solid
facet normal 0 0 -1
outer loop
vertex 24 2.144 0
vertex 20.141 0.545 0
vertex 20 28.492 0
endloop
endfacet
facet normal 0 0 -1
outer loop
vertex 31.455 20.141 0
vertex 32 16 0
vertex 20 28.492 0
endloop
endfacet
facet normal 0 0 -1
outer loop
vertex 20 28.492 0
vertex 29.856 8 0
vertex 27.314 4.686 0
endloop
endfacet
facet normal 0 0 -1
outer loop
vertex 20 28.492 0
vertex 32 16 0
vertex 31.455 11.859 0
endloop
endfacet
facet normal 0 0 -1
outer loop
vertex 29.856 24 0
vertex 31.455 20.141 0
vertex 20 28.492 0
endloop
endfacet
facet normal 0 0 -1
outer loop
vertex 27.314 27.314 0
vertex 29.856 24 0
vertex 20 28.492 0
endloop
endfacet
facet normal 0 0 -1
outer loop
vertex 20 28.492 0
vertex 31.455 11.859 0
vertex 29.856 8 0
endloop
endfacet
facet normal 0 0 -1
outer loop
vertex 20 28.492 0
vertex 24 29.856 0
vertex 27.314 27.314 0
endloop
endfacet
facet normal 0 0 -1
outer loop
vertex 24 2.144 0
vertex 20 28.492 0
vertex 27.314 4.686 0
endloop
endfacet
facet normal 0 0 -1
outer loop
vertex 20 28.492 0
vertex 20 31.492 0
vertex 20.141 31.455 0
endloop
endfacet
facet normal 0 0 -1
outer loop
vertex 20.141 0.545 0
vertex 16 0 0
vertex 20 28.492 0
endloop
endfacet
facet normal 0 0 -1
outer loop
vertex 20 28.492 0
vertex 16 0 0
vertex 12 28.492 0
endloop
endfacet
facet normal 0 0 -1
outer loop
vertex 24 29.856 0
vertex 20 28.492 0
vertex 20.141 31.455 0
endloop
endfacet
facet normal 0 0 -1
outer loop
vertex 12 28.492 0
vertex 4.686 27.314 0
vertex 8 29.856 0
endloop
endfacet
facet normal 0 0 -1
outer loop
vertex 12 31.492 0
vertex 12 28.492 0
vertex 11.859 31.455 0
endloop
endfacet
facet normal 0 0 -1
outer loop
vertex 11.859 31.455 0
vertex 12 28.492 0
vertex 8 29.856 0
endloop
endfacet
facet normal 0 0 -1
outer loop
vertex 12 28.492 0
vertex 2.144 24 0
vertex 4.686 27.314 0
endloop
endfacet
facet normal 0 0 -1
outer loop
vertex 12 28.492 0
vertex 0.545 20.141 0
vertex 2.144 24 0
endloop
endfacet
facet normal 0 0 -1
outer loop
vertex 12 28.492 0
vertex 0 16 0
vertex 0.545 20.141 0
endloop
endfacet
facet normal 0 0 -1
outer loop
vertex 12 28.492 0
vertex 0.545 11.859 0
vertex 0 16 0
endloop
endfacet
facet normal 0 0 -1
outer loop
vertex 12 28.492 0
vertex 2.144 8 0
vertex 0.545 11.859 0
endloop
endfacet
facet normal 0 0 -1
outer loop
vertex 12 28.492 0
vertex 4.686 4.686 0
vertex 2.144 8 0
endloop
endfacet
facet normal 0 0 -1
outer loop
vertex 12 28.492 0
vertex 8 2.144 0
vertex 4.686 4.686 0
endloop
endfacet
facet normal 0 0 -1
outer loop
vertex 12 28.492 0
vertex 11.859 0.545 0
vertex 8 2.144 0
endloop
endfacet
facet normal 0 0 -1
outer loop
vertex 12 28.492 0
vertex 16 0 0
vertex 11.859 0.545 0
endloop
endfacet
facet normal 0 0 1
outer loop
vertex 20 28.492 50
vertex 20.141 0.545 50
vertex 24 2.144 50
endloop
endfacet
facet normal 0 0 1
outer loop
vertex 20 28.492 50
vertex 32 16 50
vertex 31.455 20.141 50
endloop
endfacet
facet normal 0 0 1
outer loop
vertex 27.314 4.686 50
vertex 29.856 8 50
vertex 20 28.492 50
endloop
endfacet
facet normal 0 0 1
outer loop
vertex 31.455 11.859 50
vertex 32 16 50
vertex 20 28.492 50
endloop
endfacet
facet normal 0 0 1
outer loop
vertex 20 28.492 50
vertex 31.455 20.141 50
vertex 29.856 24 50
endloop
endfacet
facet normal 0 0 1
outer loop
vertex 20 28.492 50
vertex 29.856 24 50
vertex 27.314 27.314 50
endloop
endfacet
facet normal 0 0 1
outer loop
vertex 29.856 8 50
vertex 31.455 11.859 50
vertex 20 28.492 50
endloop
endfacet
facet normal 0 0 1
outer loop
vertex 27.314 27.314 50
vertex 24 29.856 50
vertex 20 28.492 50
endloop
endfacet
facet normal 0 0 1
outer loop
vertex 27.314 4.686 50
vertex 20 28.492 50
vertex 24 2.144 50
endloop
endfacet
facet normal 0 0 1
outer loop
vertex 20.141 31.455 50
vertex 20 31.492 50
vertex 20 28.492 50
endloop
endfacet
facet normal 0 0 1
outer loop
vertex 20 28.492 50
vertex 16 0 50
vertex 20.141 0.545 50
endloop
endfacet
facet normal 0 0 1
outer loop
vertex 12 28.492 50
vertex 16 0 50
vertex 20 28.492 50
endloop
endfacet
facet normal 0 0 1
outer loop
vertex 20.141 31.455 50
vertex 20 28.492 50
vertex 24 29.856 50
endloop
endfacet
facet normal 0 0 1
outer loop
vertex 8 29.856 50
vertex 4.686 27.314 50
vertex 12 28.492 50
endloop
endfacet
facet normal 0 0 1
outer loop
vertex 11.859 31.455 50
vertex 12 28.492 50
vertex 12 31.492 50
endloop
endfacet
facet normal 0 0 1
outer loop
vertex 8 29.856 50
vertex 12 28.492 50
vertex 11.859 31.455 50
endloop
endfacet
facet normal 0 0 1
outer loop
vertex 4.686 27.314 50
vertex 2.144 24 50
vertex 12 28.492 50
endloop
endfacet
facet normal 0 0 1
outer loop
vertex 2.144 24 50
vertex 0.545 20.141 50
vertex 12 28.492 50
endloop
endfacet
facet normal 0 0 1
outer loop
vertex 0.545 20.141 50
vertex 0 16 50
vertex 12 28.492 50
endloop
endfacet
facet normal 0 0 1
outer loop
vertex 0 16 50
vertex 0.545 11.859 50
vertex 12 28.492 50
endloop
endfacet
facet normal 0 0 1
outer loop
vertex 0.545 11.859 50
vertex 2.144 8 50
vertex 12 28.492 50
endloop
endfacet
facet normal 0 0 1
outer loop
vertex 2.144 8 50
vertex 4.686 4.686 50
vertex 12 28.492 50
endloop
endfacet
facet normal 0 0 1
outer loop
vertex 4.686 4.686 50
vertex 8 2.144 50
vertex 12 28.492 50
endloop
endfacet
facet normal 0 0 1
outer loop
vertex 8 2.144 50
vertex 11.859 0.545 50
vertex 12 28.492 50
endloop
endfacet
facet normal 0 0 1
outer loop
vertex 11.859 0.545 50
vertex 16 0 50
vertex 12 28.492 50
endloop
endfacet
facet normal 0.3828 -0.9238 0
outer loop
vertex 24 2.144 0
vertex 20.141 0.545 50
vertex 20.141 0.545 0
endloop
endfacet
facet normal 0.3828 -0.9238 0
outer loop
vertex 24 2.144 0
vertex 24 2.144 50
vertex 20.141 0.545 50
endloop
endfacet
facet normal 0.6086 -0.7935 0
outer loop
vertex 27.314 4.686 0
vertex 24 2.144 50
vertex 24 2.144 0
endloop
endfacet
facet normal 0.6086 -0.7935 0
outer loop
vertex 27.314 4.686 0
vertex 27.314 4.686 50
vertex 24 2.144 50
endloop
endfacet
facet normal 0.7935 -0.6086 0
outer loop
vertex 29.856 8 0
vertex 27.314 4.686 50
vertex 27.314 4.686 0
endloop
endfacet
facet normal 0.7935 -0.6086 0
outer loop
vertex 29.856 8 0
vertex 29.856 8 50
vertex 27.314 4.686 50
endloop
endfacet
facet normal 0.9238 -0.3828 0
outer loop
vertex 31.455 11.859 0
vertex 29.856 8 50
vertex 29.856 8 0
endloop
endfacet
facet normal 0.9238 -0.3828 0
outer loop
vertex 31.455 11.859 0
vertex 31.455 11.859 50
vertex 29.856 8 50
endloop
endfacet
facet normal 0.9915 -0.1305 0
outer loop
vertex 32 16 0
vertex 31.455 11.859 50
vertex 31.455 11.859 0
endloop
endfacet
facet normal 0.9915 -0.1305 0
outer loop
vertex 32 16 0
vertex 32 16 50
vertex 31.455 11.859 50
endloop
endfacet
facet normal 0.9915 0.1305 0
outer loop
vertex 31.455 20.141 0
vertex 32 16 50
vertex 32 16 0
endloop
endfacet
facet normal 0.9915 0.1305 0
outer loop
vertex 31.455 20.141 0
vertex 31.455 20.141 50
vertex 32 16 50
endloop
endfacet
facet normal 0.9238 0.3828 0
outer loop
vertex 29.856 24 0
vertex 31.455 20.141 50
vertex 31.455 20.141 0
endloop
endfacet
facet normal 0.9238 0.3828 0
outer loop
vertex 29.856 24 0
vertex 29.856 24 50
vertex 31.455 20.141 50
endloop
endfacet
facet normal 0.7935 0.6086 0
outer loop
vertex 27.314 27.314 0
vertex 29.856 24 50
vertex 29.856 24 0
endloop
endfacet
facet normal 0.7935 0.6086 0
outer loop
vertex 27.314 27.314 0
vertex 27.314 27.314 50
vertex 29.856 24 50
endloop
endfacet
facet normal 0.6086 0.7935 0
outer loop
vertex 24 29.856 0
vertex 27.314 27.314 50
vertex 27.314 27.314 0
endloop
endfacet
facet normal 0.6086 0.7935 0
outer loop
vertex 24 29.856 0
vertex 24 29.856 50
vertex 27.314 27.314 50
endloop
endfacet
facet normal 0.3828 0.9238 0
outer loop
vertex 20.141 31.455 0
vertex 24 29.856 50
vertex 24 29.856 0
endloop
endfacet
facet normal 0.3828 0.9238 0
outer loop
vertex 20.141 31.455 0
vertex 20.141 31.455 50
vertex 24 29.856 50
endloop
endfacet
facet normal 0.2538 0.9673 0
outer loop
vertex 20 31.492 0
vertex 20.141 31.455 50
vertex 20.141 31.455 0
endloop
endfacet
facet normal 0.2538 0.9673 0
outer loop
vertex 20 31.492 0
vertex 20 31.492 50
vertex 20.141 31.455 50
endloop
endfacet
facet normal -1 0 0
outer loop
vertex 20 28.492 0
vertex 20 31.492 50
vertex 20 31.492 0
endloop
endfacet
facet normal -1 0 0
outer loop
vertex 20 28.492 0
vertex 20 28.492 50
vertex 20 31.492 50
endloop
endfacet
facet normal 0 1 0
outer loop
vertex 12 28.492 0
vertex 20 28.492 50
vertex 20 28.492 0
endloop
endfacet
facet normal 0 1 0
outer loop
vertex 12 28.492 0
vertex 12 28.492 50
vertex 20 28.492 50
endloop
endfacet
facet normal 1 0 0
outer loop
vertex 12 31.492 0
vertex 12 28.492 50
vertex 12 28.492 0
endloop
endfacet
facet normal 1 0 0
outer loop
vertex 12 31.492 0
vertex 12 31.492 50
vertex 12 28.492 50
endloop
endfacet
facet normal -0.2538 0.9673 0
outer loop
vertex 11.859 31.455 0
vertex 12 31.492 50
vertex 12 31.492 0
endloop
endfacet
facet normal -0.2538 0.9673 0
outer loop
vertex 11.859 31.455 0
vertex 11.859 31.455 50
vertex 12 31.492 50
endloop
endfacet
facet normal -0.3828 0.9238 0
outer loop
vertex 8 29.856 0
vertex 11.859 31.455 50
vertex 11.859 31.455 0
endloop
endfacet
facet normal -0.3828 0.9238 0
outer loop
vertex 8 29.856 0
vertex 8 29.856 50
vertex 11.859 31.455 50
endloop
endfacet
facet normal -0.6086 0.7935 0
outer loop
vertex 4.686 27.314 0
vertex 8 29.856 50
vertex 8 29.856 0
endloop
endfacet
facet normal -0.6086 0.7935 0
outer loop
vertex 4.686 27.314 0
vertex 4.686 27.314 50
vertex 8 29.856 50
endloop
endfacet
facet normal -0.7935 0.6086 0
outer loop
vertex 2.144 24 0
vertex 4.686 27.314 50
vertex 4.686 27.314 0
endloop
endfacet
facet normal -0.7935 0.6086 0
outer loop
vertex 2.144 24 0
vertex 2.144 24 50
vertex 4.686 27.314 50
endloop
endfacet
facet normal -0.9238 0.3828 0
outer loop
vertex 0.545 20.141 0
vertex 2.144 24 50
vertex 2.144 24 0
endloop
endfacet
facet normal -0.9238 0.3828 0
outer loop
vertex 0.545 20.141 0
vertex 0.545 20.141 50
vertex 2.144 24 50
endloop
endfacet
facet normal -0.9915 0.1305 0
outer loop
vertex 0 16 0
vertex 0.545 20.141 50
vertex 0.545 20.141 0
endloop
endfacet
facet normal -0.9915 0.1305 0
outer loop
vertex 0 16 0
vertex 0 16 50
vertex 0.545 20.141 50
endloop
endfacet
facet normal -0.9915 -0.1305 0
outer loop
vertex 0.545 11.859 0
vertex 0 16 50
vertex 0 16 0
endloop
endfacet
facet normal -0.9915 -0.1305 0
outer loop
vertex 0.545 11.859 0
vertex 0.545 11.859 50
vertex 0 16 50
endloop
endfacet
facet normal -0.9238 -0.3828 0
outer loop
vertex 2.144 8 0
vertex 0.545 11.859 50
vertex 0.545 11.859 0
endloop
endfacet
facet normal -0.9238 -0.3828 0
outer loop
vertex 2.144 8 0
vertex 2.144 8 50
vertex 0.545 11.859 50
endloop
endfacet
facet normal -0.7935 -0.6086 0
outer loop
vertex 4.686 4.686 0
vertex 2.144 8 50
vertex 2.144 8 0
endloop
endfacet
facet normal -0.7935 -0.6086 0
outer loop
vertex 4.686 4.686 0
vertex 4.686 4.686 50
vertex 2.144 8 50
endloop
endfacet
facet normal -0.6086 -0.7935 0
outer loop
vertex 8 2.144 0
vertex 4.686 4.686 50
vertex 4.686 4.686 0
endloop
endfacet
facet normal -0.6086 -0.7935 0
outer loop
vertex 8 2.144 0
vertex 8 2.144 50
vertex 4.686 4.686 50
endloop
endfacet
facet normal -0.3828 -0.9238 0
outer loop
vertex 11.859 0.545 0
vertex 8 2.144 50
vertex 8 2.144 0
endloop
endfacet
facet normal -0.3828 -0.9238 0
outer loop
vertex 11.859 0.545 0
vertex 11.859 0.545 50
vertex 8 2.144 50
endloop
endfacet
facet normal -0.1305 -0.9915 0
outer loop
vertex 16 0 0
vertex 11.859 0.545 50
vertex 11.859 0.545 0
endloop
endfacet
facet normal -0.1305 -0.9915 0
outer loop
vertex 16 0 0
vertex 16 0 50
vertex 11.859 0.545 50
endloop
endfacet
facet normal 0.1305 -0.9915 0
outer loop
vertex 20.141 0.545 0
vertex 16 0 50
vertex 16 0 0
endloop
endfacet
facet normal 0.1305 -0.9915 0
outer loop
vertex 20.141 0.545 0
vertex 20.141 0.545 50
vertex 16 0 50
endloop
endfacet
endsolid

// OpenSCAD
$fn = 32;

// ----------------------------------------------------------------------
// Keyway shaft: d32 shaft, key 8 x 3 mm
// ----------------------------------------------------------------------

// --- parameters (mm) ---
shaft_r = 16;             // shaft radius
key_w = 8;                // keyway width
key_d = 3;                // keyway depth below the surface line
plate_t = 50;             // shaft length, Z (extrusion height)

shaft_d = 2 * shaft_r;  // shaft diameter
circle_step = 15;  // polygon sampling step, degrees

profile = [[11.859, 31.455], [8, 29.856], [4.686, 27.314], [2.144, 24], [0.545, 20.141], [0, 16], [0.545, 11.859], [2.144, 8], [4.686, 4.686], [8, 2.144], [11.859, 0.545], [16, 0], [20.141, 0.545], [24, 2.144], [27.314, 4.686], [29.856, 8], [31.455, 11.859], [32, 16], [31.455, 20.141], [29.856, 24], [27.314, 27.314], [24, 29.856], [20.141, 31.455], [20, 31.492], [20, 28.492], [12, 28.492], [12, 31.492]];  // primary outline, 27 points, counter clockwise

// --- the one profile operation ---
linear_extrude(height = plate_t) polygon(points = profile);
